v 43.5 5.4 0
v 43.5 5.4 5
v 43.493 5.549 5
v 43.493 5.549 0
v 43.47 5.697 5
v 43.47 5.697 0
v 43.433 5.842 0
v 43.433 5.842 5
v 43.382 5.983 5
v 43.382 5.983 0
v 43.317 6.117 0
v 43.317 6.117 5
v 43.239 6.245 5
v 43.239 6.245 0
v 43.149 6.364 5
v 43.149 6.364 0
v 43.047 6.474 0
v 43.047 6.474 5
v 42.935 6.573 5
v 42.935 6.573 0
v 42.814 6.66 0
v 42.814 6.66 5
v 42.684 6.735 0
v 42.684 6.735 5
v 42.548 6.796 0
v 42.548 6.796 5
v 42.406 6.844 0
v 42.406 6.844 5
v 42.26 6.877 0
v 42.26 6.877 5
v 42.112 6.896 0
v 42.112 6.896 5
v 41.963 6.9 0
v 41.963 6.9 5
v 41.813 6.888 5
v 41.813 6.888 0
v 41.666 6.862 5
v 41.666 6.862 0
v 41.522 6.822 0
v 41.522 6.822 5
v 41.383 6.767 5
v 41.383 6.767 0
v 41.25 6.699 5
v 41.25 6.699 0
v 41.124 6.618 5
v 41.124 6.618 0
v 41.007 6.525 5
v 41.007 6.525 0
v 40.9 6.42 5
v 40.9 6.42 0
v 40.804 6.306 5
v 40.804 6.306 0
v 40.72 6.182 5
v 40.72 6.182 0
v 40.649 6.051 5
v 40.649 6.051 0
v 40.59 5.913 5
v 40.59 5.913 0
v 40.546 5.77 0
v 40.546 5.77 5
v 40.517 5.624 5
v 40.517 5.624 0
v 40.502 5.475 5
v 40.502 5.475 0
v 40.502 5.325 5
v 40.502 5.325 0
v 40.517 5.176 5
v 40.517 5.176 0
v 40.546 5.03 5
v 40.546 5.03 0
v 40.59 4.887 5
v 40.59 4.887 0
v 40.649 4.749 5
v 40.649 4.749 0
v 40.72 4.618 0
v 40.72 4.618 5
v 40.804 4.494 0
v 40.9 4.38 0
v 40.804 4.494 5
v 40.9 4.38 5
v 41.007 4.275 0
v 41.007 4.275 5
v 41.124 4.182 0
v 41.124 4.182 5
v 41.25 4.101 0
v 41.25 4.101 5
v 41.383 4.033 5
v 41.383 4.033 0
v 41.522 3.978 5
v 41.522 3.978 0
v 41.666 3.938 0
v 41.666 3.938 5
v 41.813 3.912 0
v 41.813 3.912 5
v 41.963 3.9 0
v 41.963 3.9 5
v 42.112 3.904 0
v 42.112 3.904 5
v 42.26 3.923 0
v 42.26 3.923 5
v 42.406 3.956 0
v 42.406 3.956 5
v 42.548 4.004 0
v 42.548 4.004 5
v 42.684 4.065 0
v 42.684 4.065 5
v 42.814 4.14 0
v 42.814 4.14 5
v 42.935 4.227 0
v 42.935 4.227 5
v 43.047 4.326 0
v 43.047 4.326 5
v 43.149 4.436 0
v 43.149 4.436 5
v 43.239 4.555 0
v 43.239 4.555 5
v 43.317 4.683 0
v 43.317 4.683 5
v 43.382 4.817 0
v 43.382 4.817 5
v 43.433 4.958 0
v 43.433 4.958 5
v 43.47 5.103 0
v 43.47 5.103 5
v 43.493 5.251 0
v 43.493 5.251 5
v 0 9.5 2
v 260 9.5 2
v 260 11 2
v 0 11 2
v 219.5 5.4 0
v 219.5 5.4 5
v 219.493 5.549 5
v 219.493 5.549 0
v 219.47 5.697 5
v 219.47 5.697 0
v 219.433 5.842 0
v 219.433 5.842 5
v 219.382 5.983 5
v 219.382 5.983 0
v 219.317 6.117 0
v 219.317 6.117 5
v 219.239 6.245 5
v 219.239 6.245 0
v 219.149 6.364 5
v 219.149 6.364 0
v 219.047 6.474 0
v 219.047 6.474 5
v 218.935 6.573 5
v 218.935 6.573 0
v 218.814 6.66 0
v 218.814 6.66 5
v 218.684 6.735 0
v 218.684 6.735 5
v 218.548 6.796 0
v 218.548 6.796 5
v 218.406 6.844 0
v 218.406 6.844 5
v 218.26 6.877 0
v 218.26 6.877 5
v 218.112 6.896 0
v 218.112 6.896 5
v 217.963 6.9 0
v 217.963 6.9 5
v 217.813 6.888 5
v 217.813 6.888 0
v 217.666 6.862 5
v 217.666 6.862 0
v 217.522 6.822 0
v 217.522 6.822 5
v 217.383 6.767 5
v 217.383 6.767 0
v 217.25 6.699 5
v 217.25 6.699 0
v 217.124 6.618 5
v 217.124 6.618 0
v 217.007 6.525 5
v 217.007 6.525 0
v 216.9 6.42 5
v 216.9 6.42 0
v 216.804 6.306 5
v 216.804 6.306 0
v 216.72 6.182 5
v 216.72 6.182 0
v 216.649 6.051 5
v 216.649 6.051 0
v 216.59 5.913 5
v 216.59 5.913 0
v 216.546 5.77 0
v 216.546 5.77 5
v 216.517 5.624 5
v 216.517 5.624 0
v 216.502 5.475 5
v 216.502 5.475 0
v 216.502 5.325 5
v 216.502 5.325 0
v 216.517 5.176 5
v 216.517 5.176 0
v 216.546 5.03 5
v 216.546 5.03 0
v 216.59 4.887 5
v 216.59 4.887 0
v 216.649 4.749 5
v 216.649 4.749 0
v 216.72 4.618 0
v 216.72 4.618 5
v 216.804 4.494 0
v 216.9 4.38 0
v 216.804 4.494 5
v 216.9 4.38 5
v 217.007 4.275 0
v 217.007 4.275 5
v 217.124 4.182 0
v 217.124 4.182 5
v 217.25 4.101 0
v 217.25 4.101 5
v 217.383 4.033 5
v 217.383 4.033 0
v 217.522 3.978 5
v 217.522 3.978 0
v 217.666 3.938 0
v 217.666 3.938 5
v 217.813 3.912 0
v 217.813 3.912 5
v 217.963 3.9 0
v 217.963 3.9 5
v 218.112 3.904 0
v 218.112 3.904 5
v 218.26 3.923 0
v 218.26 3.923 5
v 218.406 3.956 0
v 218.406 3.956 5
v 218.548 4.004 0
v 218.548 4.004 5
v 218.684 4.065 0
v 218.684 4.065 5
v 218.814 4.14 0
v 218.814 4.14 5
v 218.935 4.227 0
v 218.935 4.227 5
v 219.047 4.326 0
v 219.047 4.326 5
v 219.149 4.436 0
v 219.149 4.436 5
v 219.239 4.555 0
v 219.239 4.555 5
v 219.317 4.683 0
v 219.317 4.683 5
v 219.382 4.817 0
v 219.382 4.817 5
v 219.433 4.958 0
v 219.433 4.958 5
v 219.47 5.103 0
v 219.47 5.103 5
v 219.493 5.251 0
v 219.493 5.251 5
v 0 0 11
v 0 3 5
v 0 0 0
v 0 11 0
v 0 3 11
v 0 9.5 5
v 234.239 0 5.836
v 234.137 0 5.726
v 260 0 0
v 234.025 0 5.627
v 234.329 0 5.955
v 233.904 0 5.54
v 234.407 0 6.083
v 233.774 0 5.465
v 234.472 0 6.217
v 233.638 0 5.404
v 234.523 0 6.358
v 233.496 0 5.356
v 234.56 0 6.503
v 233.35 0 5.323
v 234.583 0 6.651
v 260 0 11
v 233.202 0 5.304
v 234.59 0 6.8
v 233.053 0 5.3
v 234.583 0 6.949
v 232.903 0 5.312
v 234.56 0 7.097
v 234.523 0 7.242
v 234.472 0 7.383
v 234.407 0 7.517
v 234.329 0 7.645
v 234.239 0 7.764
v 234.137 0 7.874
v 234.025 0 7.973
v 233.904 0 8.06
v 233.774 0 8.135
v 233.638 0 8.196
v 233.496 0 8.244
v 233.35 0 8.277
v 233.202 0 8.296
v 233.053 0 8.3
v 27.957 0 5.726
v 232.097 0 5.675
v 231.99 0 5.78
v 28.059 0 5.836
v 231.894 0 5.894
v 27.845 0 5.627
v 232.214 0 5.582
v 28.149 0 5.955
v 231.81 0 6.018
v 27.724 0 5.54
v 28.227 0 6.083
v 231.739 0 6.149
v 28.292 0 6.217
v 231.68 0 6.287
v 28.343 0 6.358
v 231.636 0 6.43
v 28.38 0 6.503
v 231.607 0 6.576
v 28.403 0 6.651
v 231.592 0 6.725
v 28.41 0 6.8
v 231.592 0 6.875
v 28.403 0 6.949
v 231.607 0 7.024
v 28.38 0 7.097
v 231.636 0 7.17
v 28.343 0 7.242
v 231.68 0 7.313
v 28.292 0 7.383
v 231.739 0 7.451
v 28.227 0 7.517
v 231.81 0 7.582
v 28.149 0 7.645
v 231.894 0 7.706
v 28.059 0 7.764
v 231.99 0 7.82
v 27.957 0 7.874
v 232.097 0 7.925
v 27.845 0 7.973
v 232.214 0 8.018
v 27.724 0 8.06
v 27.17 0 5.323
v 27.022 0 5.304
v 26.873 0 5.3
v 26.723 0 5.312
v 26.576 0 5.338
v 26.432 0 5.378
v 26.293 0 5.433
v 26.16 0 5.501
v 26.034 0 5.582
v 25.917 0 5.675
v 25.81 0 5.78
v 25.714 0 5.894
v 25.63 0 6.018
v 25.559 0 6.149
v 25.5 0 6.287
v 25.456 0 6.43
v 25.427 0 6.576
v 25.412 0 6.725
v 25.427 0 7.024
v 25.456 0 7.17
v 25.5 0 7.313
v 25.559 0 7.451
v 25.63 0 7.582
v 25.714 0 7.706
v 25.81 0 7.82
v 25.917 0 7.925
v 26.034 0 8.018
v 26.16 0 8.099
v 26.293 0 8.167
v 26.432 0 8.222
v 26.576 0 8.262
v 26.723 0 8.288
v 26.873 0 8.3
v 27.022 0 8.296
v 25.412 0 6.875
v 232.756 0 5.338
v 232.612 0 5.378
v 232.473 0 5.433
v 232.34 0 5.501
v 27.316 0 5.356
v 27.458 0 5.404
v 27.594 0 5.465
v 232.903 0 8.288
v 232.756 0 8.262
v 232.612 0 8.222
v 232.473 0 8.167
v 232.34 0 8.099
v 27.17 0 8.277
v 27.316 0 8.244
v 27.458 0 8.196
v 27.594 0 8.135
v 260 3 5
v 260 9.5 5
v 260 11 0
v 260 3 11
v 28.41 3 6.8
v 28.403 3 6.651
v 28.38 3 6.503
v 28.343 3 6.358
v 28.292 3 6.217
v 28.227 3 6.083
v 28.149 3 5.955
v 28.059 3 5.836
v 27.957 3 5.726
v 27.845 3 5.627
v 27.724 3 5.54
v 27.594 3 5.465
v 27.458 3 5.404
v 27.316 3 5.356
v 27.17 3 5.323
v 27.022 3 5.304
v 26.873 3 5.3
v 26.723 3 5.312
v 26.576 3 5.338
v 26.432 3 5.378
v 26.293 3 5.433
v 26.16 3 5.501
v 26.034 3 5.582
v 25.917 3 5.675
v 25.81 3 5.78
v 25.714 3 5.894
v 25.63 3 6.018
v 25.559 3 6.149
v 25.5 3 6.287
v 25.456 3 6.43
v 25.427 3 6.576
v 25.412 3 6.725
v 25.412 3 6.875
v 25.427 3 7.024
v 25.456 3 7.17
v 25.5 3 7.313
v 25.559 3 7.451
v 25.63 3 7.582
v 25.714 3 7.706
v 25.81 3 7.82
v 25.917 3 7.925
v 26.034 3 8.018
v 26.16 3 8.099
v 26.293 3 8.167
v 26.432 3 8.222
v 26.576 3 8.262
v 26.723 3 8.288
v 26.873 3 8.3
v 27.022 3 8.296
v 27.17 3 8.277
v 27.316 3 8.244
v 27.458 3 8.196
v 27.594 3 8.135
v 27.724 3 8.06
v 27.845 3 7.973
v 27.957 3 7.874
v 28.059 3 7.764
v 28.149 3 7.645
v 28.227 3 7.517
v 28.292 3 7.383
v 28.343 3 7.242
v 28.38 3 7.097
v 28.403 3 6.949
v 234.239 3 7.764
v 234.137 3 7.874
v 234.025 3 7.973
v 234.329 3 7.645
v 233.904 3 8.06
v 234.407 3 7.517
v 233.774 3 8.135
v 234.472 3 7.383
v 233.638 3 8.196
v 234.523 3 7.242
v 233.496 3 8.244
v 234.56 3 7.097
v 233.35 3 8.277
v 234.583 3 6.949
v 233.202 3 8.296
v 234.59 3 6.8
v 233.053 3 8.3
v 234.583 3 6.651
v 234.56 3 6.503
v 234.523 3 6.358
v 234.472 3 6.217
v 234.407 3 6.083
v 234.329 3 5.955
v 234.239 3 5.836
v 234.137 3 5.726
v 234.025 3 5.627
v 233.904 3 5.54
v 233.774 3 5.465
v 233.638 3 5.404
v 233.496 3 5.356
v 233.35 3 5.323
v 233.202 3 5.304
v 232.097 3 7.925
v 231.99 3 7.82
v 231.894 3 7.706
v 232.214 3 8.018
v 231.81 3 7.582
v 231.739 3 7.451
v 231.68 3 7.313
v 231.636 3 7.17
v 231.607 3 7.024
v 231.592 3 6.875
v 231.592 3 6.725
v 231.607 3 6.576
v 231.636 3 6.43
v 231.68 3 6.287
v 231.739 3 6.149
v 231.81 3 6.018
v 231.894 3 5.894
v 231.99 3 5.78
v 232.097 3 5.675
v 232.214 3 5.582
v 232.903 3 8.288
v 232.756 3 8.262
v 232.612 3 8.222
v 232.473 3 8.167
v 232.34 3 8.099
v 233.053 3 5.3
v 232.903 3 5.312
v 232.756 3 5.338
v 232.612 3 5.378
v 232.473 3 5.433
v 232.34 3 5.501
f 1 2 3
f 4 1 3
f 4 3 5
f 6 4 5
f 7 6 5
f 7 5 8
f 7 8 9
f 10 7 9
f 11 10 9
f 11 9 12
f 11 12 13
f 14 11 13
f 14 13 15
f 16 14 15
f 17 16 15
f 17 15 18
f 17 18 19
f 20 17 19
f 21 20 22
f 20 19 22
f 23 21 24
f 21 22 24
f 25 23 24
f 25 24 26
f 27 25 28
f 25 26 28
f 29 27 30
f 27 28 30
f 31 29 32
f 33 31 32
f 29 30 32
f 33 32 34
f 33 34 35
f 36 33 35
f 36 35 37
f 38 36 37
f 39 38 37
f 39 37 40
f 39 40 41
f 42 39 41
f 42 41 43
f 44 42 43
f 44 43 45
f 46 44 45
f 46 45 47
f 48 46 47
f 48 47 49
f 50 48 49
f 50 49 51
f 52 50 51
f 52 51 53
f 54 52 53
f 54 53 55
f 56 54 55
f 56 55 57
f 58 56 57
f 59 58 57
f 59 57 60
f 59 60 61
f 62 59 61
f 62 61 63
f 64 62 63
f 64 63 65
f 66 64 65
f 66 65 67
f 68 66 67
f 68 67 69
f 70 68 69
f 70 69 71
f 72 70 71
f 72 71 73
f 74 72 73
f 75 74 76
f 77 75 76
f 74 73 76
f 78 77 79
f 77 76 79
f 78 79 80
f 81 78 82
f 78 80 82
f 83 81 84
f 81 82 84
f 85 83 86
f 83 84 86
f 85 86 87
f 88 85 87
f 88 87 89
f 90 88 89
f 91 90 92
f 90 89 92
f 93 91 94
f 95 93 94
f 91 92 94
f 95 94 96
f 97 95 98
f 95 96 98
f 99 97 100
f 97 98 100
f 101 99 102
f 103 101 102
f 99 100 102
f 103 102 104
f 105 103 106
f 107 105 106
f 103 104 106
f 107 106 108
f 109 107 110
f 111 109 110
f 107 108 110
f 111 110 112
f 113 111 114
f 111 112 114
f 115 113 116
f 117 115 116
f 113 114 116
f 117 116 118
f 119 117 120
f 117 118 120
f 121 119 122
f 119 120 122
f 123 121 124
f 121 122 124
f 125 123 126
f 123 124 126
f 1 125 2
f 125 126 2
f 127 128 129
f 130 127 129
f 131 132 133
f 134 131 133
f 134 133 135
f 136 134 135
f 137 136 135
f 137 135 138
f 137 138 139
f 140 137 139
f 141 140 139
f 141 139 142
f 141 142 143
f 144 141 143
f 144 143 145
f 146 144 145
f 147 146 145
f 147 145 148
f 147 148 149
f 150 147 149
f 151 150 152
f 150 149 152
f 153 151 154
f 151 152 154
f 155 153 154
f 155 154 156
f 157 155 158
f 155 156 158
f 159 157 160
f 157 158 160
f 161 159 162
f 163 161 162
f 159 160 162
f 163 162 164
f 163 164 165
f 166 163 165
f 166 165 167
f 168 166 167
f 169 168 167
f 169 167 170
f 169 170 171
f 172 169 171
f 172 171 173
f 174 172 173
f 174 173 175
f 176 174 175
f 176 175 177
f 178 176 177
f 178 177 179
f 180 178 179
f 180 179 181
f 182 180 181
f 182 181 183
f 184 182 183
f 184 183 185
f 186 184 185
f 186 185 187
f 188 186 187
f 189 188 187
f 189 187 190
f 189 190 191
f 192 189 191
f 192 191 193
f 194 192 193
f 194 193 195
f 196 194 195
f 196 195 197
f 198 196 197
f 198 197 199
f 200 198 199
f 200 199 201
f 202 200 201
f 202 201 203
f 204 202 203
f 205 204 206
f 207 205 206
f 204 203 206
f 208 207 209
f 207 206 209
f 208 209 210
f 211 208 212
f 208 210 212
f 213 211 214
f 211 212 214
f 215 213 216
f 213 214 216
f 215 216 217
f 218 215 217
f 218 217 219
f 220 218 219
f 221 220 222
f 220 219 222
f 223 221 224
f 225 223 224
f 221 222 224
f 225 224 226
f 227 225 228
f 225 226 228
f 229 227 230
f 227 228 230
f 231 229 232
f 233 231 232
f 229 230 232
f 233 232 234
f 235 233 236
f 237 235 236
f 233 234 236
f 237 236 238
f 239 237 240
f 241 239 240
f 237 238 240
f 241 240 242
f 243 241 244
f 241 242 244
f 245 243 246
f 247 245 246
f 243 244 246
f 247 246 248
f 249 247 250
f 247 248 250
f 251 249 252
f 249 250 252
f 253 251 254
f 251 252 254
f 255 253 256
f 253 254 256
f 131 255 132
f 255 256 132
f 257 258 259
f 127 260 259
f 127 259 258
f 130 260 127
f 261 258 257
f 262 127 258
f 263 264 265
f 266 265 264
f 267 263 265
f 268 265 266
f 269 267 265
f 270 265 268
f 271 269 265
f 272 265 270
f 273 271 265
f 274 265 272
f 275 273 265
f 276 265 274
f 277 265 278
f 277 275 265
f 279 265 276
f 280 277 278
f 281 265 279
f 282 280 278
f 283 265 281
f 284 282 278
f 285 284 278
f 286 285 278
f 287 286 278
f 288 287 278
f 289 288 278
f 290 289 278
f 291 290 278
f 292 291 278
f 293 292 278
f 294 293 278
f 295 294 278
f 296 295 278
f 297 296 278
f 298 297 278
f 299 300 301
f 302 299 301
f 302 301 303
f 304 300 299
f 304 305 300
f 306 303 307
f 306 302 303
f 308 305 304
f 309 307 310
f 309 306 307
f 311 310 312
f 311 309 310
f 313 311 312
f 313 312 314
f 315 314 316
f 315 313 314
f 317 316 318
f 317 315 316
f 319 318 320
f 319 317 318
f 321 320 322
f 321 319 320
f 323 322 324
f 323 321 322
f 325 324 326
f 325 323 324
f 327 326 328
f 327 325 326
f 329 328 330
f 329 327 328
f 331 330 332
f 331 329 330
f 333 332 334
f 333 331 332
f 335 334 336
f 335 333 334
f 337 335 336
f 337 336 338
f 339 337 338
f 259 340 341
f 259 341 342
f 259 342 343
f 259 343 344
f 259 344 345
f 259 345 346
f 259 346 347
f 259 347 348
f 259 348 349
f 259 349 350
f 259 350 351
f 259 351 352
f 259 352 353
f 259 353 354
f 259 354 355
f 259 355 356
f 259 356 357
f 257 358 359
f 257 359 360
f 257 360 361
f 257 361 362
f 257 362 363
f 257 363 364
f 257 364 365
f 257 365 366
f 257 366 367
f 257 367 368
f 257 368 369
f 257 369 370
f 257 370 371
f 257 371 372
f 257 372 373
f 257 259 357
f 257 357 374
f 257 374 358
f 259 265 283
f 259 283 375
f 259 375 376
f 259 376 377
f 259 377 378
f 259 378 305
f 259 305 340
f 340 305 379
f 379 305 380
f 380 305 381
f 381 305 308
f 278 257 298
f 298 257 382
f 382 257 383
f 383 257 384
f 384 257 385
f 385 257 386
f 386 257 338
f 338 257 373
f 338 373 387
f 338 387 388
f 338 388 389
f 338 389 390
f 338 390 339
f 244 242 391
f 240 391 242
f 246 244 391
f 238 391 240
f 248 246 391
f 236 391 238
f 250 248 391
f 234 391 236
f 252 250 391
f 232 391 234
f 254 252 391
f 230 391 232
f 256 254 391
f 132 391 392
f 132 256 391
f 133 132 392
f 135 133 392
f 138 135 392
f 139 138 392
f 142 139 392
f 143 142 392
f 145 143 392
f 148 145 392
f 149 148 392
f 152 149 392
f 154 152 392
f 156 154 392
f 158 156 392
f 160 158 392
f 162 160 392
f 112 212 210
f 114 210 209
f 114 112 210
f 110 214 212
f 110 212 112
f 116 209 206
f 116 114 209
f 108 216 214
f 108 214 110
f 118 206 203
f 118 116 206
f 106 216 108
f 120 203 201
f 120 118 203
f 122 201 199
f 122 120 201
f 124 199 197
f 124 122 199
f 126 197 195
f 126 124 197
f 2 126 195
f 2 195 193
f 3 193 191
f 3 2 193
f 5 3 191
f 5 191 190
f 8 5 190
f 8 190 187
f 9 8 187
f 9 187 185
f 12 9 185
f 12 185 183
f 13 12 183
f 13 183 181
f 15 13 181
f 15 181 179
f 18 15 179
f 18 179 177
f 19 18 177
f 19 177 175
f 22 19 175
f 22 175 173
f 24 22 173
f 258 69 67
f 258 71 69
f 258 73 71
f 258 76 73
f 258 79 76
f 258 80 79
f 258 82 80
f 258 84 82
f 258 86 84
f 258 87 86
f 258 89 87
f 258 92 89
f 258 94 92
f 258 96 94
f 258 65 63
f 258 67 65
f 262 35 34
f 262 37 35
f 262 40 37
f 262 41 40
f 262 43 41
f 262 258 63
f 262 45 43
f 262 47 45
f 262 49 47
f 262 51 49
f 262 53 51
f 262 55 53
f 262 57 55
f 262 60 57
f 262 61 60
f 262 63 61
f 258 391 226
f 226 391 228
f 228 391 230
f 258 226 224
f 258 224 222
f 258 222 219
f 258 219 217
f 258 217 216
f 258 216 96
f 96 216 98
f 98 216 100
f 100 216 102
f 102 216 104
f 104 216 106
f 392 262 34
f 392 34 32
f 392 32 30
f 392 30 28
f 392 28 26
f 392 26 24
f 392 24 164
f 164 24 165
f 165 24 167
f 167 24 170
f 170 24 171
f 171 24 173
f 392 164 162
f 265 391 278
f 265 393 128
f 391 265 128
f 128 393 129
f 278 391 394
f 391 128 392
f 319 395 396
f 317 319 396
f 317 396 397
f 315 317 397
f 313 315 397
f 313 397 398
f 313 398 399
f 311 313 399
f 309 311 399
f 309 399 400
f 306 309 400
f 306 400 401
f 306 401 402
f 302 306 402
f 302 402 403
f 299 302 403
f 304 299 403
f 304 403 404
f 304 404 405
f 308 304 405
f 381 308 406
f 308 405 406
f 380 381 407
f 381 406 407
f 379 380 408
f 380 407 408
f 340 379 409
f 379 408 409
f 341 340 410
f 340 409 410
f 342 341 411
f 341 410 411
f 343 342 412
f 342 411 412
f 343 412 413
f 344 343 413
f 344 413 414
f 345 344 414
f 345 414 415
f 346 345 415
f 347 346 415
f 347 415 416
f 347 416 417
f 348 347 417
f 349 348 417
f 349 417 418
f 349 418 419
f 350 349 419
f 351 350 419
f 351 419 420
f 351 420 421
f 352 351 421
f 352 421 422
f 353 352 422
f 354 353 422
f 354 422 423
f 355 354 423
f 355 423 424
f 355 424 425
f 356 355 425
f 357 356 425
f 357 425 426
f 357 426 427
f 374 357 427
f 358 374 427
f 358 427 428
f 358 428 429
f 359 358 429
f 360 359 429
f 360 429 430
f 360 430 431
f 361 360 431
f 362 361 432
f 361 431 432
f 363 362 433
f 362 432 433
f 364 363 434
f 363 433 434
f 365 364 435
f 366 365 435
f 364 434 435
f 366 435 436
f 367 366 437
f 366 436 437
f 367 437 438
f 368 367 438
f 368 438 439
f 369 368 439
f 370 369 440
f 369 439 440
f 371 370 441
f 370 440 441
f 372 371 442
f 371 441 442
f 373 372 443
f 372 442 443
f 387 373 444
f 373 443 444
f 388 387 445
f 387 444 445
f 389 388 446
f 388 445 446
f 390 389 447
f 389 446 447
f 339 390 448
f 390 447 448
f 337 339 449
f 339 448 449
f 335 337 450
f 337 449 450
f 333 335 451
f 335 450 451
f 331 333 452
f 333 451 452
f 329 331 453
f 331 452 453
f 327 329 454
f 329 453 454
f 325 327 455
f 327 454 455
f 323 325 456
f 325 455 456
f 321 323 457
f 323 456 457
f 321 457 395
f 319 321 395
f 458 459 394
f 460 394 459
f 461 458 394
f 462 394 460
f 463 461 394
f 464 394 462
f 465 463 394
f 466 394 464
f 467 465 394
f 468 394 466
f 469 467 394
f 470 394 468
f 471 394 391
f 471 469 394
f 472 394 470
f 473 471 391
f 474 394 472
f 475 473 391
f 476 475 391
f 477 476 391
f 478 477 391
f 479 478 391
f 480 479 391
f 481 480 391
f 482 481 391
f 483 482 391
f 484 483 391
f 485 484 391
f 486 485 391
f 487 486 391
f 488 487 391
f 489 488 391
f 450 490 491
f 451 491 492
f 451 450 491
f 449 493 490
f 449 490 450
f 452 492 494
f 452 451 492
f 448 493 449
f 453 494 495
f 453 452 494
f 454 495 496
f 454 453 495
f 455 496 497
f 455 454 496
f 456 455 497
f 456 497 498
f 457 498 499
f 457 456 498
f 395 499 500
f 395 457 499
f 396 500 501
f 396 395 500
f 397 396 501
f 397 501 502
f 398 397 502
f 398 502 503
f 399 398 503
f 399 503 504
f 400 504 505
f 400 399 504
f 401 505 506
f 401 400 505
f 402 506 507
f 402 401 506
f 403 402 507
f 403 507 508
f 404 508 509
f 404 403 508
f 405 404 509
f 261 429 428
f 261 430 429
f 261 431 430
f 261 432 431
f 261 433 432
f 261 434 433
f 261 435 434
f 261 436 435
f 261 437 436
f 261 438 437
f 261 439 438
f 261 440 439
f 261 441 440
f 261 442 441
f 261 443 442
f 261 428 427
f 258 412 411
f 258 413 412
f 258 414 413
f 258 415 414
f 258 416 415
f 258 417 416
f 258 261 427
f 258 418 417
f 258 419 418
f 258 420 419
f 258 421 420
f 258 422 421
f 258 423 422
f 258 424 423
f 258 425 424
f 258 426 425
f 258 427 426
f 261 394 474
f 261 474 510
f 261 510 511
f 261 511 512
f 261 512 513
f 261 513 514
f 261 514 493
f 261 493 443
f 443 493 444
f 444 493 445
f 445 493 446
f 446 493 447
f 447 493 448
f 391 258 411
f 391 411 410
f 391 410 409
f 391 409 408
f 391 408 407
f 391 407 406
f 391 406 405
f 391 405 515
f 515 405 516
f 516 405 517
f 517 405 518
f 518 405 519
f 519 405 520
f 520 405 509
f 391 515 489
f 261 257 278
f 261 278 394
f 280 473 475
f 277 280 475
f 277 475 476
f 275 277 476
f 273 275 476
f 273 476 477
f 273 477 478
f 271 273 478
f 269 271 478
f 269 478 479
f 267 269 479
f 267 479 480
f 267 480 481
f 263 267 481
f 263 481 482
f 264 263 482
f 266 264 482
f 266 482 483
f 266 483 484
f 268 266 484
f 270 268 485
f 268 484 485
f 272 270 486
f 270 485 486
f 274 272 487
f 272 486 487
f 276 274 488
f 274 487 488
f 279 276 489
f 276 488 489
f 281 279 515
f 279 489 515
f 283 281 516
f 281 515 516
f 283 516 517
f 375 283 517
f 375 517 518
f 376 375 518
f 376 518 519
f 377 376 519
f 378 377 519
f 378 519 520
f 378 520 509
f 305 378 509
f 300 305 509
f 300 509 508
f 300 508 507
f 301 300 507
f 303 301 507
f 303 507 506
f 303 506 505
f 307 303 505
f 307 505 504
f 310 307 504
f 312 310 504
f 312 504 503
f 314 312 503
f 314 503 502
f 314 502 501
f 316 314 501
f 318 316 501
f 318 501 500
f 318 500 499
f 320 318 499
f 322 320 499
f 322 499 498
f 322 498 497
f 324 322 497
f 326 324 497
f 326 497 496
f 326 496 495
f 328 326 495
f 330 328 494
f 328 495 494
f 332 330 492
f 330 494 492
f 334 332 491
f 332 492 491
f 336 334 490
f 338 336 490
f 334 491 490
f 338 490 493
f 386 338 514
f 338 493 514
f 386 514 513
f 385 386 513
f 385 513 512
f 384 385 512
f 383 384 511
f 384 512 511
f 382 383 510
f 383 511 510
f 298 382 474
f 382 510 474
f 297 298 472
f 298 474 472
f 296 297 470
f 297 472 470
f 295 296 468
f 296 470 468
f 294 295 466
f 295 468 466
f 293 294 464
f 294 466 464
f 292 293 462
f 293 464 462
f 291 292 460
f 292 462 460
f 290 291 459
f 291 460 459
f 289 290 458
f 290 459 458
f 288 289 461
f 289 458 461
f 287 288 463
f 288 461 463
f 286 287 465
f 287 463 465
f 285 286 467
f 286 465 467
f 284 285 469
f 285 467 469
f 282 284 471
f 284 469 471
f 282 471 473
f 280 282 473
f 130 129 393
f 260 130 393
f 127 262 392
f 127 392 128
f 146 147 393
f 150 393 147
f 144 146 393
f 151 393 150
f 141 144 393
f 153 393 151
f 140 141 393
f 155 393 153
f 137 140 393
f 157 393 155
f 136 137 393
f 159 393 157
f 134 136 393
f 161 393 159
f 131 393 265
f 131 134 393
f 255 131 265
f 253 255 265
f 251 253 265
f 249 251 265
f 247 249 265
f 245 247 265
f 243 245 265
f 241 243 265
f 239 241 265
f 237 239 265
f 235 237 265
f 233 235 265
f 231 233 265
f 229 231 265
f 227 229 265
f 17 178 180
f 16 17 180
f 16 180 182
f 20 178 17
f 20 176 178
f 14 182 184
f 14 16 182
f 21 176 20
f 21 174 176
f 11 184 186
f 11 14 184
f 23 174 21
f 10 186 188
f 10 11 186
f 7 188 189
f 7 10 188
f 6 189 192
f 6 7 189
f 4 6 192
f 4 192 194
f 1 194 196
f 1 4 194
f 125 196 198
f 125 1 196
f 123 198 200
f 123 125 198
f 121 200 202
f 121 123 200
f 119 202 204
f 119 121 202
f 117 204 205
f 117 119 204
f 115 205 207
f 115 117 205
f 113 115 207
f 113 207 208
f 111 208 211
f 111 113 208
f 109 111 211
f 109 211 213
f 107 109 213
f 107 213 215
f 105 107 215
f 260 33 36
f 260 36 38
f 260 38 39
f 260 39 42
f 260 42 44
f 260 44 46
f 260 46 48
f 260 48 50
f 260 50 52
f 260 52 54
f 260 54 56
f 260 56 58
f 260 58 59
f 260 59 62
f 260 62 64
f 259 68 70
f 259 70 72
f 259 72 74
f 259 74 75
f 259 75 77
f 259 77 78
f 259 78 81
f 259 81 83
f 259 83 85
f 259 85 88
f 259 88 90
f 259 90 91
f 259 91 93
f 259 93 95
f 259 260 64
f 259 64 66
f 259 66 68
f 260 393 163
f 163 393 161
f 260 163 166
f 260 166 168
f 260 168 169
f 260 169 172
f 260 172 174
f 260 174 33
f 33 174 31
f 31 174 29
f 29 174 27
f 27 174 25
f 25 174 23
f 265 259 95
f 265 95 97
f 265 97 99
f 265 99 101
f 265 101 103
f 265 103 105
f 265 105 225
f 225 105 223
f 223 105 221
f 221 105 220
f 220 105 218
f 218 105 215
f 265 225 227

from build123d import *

# Parameters (mm, degrees)
EXTRUDE_1_DEPTH     = 260
SKETCH_4_R          = 1.5
CUT_EXTRUDE_3_DEPTH = 6
SKETCH_5_R          = 1.5
CUT_EXTRUDE_4_DEPTH = 4


with BuildPart() as part:
    # Эскиз1 → Бобышка-Вытянуть1 (new body)
    with BuildSketch(Plane(origin=(0, 0, 0), x_dir=(0, 0, -1), z_dir=(1, 0, 0))):
        Polygon((0, 0), (-11, 0), (-11, 3), (-5, 3), (-5, 9.5), (-2, 9.5), (-2, 11), (0, 11), align=None)
    extrude(amount=EXTRUDE_1_DEPTH)

    # Эскиз4 → Вырез-Вытянуть3 (cut, through all)
    with BuildSketch(Plane.XY.offset(5)):
        with Locations((42, 5.4)):
            Circle(SKETCH_4_R)
        with Locations((218, 5.4)):
            Circle(SKETCH_4_R)
    extrude(amount=-CUT_EXTRUDE_3_DEPTH, mode=Mode.SUBTRACT)

    # Эскиз5 → Вырез-Вытянуть4 (cut, through all)
    with BuildSketch(Plane(origin=(0, 3, 0), x_dir=(1, 0, 0), z_dir=(0, 1, 0))):
        with Locations((26.91, -6.8)):
            Circle(SKETCH_5_R)
        with Locations((233.09, -6.8)):
            Circle(SKETCH_5_R)
    extrude(amount=-CUT_EXTRUDE_4_DEPTH, mode=Mode.SUBTRACT)


solid = part.part
